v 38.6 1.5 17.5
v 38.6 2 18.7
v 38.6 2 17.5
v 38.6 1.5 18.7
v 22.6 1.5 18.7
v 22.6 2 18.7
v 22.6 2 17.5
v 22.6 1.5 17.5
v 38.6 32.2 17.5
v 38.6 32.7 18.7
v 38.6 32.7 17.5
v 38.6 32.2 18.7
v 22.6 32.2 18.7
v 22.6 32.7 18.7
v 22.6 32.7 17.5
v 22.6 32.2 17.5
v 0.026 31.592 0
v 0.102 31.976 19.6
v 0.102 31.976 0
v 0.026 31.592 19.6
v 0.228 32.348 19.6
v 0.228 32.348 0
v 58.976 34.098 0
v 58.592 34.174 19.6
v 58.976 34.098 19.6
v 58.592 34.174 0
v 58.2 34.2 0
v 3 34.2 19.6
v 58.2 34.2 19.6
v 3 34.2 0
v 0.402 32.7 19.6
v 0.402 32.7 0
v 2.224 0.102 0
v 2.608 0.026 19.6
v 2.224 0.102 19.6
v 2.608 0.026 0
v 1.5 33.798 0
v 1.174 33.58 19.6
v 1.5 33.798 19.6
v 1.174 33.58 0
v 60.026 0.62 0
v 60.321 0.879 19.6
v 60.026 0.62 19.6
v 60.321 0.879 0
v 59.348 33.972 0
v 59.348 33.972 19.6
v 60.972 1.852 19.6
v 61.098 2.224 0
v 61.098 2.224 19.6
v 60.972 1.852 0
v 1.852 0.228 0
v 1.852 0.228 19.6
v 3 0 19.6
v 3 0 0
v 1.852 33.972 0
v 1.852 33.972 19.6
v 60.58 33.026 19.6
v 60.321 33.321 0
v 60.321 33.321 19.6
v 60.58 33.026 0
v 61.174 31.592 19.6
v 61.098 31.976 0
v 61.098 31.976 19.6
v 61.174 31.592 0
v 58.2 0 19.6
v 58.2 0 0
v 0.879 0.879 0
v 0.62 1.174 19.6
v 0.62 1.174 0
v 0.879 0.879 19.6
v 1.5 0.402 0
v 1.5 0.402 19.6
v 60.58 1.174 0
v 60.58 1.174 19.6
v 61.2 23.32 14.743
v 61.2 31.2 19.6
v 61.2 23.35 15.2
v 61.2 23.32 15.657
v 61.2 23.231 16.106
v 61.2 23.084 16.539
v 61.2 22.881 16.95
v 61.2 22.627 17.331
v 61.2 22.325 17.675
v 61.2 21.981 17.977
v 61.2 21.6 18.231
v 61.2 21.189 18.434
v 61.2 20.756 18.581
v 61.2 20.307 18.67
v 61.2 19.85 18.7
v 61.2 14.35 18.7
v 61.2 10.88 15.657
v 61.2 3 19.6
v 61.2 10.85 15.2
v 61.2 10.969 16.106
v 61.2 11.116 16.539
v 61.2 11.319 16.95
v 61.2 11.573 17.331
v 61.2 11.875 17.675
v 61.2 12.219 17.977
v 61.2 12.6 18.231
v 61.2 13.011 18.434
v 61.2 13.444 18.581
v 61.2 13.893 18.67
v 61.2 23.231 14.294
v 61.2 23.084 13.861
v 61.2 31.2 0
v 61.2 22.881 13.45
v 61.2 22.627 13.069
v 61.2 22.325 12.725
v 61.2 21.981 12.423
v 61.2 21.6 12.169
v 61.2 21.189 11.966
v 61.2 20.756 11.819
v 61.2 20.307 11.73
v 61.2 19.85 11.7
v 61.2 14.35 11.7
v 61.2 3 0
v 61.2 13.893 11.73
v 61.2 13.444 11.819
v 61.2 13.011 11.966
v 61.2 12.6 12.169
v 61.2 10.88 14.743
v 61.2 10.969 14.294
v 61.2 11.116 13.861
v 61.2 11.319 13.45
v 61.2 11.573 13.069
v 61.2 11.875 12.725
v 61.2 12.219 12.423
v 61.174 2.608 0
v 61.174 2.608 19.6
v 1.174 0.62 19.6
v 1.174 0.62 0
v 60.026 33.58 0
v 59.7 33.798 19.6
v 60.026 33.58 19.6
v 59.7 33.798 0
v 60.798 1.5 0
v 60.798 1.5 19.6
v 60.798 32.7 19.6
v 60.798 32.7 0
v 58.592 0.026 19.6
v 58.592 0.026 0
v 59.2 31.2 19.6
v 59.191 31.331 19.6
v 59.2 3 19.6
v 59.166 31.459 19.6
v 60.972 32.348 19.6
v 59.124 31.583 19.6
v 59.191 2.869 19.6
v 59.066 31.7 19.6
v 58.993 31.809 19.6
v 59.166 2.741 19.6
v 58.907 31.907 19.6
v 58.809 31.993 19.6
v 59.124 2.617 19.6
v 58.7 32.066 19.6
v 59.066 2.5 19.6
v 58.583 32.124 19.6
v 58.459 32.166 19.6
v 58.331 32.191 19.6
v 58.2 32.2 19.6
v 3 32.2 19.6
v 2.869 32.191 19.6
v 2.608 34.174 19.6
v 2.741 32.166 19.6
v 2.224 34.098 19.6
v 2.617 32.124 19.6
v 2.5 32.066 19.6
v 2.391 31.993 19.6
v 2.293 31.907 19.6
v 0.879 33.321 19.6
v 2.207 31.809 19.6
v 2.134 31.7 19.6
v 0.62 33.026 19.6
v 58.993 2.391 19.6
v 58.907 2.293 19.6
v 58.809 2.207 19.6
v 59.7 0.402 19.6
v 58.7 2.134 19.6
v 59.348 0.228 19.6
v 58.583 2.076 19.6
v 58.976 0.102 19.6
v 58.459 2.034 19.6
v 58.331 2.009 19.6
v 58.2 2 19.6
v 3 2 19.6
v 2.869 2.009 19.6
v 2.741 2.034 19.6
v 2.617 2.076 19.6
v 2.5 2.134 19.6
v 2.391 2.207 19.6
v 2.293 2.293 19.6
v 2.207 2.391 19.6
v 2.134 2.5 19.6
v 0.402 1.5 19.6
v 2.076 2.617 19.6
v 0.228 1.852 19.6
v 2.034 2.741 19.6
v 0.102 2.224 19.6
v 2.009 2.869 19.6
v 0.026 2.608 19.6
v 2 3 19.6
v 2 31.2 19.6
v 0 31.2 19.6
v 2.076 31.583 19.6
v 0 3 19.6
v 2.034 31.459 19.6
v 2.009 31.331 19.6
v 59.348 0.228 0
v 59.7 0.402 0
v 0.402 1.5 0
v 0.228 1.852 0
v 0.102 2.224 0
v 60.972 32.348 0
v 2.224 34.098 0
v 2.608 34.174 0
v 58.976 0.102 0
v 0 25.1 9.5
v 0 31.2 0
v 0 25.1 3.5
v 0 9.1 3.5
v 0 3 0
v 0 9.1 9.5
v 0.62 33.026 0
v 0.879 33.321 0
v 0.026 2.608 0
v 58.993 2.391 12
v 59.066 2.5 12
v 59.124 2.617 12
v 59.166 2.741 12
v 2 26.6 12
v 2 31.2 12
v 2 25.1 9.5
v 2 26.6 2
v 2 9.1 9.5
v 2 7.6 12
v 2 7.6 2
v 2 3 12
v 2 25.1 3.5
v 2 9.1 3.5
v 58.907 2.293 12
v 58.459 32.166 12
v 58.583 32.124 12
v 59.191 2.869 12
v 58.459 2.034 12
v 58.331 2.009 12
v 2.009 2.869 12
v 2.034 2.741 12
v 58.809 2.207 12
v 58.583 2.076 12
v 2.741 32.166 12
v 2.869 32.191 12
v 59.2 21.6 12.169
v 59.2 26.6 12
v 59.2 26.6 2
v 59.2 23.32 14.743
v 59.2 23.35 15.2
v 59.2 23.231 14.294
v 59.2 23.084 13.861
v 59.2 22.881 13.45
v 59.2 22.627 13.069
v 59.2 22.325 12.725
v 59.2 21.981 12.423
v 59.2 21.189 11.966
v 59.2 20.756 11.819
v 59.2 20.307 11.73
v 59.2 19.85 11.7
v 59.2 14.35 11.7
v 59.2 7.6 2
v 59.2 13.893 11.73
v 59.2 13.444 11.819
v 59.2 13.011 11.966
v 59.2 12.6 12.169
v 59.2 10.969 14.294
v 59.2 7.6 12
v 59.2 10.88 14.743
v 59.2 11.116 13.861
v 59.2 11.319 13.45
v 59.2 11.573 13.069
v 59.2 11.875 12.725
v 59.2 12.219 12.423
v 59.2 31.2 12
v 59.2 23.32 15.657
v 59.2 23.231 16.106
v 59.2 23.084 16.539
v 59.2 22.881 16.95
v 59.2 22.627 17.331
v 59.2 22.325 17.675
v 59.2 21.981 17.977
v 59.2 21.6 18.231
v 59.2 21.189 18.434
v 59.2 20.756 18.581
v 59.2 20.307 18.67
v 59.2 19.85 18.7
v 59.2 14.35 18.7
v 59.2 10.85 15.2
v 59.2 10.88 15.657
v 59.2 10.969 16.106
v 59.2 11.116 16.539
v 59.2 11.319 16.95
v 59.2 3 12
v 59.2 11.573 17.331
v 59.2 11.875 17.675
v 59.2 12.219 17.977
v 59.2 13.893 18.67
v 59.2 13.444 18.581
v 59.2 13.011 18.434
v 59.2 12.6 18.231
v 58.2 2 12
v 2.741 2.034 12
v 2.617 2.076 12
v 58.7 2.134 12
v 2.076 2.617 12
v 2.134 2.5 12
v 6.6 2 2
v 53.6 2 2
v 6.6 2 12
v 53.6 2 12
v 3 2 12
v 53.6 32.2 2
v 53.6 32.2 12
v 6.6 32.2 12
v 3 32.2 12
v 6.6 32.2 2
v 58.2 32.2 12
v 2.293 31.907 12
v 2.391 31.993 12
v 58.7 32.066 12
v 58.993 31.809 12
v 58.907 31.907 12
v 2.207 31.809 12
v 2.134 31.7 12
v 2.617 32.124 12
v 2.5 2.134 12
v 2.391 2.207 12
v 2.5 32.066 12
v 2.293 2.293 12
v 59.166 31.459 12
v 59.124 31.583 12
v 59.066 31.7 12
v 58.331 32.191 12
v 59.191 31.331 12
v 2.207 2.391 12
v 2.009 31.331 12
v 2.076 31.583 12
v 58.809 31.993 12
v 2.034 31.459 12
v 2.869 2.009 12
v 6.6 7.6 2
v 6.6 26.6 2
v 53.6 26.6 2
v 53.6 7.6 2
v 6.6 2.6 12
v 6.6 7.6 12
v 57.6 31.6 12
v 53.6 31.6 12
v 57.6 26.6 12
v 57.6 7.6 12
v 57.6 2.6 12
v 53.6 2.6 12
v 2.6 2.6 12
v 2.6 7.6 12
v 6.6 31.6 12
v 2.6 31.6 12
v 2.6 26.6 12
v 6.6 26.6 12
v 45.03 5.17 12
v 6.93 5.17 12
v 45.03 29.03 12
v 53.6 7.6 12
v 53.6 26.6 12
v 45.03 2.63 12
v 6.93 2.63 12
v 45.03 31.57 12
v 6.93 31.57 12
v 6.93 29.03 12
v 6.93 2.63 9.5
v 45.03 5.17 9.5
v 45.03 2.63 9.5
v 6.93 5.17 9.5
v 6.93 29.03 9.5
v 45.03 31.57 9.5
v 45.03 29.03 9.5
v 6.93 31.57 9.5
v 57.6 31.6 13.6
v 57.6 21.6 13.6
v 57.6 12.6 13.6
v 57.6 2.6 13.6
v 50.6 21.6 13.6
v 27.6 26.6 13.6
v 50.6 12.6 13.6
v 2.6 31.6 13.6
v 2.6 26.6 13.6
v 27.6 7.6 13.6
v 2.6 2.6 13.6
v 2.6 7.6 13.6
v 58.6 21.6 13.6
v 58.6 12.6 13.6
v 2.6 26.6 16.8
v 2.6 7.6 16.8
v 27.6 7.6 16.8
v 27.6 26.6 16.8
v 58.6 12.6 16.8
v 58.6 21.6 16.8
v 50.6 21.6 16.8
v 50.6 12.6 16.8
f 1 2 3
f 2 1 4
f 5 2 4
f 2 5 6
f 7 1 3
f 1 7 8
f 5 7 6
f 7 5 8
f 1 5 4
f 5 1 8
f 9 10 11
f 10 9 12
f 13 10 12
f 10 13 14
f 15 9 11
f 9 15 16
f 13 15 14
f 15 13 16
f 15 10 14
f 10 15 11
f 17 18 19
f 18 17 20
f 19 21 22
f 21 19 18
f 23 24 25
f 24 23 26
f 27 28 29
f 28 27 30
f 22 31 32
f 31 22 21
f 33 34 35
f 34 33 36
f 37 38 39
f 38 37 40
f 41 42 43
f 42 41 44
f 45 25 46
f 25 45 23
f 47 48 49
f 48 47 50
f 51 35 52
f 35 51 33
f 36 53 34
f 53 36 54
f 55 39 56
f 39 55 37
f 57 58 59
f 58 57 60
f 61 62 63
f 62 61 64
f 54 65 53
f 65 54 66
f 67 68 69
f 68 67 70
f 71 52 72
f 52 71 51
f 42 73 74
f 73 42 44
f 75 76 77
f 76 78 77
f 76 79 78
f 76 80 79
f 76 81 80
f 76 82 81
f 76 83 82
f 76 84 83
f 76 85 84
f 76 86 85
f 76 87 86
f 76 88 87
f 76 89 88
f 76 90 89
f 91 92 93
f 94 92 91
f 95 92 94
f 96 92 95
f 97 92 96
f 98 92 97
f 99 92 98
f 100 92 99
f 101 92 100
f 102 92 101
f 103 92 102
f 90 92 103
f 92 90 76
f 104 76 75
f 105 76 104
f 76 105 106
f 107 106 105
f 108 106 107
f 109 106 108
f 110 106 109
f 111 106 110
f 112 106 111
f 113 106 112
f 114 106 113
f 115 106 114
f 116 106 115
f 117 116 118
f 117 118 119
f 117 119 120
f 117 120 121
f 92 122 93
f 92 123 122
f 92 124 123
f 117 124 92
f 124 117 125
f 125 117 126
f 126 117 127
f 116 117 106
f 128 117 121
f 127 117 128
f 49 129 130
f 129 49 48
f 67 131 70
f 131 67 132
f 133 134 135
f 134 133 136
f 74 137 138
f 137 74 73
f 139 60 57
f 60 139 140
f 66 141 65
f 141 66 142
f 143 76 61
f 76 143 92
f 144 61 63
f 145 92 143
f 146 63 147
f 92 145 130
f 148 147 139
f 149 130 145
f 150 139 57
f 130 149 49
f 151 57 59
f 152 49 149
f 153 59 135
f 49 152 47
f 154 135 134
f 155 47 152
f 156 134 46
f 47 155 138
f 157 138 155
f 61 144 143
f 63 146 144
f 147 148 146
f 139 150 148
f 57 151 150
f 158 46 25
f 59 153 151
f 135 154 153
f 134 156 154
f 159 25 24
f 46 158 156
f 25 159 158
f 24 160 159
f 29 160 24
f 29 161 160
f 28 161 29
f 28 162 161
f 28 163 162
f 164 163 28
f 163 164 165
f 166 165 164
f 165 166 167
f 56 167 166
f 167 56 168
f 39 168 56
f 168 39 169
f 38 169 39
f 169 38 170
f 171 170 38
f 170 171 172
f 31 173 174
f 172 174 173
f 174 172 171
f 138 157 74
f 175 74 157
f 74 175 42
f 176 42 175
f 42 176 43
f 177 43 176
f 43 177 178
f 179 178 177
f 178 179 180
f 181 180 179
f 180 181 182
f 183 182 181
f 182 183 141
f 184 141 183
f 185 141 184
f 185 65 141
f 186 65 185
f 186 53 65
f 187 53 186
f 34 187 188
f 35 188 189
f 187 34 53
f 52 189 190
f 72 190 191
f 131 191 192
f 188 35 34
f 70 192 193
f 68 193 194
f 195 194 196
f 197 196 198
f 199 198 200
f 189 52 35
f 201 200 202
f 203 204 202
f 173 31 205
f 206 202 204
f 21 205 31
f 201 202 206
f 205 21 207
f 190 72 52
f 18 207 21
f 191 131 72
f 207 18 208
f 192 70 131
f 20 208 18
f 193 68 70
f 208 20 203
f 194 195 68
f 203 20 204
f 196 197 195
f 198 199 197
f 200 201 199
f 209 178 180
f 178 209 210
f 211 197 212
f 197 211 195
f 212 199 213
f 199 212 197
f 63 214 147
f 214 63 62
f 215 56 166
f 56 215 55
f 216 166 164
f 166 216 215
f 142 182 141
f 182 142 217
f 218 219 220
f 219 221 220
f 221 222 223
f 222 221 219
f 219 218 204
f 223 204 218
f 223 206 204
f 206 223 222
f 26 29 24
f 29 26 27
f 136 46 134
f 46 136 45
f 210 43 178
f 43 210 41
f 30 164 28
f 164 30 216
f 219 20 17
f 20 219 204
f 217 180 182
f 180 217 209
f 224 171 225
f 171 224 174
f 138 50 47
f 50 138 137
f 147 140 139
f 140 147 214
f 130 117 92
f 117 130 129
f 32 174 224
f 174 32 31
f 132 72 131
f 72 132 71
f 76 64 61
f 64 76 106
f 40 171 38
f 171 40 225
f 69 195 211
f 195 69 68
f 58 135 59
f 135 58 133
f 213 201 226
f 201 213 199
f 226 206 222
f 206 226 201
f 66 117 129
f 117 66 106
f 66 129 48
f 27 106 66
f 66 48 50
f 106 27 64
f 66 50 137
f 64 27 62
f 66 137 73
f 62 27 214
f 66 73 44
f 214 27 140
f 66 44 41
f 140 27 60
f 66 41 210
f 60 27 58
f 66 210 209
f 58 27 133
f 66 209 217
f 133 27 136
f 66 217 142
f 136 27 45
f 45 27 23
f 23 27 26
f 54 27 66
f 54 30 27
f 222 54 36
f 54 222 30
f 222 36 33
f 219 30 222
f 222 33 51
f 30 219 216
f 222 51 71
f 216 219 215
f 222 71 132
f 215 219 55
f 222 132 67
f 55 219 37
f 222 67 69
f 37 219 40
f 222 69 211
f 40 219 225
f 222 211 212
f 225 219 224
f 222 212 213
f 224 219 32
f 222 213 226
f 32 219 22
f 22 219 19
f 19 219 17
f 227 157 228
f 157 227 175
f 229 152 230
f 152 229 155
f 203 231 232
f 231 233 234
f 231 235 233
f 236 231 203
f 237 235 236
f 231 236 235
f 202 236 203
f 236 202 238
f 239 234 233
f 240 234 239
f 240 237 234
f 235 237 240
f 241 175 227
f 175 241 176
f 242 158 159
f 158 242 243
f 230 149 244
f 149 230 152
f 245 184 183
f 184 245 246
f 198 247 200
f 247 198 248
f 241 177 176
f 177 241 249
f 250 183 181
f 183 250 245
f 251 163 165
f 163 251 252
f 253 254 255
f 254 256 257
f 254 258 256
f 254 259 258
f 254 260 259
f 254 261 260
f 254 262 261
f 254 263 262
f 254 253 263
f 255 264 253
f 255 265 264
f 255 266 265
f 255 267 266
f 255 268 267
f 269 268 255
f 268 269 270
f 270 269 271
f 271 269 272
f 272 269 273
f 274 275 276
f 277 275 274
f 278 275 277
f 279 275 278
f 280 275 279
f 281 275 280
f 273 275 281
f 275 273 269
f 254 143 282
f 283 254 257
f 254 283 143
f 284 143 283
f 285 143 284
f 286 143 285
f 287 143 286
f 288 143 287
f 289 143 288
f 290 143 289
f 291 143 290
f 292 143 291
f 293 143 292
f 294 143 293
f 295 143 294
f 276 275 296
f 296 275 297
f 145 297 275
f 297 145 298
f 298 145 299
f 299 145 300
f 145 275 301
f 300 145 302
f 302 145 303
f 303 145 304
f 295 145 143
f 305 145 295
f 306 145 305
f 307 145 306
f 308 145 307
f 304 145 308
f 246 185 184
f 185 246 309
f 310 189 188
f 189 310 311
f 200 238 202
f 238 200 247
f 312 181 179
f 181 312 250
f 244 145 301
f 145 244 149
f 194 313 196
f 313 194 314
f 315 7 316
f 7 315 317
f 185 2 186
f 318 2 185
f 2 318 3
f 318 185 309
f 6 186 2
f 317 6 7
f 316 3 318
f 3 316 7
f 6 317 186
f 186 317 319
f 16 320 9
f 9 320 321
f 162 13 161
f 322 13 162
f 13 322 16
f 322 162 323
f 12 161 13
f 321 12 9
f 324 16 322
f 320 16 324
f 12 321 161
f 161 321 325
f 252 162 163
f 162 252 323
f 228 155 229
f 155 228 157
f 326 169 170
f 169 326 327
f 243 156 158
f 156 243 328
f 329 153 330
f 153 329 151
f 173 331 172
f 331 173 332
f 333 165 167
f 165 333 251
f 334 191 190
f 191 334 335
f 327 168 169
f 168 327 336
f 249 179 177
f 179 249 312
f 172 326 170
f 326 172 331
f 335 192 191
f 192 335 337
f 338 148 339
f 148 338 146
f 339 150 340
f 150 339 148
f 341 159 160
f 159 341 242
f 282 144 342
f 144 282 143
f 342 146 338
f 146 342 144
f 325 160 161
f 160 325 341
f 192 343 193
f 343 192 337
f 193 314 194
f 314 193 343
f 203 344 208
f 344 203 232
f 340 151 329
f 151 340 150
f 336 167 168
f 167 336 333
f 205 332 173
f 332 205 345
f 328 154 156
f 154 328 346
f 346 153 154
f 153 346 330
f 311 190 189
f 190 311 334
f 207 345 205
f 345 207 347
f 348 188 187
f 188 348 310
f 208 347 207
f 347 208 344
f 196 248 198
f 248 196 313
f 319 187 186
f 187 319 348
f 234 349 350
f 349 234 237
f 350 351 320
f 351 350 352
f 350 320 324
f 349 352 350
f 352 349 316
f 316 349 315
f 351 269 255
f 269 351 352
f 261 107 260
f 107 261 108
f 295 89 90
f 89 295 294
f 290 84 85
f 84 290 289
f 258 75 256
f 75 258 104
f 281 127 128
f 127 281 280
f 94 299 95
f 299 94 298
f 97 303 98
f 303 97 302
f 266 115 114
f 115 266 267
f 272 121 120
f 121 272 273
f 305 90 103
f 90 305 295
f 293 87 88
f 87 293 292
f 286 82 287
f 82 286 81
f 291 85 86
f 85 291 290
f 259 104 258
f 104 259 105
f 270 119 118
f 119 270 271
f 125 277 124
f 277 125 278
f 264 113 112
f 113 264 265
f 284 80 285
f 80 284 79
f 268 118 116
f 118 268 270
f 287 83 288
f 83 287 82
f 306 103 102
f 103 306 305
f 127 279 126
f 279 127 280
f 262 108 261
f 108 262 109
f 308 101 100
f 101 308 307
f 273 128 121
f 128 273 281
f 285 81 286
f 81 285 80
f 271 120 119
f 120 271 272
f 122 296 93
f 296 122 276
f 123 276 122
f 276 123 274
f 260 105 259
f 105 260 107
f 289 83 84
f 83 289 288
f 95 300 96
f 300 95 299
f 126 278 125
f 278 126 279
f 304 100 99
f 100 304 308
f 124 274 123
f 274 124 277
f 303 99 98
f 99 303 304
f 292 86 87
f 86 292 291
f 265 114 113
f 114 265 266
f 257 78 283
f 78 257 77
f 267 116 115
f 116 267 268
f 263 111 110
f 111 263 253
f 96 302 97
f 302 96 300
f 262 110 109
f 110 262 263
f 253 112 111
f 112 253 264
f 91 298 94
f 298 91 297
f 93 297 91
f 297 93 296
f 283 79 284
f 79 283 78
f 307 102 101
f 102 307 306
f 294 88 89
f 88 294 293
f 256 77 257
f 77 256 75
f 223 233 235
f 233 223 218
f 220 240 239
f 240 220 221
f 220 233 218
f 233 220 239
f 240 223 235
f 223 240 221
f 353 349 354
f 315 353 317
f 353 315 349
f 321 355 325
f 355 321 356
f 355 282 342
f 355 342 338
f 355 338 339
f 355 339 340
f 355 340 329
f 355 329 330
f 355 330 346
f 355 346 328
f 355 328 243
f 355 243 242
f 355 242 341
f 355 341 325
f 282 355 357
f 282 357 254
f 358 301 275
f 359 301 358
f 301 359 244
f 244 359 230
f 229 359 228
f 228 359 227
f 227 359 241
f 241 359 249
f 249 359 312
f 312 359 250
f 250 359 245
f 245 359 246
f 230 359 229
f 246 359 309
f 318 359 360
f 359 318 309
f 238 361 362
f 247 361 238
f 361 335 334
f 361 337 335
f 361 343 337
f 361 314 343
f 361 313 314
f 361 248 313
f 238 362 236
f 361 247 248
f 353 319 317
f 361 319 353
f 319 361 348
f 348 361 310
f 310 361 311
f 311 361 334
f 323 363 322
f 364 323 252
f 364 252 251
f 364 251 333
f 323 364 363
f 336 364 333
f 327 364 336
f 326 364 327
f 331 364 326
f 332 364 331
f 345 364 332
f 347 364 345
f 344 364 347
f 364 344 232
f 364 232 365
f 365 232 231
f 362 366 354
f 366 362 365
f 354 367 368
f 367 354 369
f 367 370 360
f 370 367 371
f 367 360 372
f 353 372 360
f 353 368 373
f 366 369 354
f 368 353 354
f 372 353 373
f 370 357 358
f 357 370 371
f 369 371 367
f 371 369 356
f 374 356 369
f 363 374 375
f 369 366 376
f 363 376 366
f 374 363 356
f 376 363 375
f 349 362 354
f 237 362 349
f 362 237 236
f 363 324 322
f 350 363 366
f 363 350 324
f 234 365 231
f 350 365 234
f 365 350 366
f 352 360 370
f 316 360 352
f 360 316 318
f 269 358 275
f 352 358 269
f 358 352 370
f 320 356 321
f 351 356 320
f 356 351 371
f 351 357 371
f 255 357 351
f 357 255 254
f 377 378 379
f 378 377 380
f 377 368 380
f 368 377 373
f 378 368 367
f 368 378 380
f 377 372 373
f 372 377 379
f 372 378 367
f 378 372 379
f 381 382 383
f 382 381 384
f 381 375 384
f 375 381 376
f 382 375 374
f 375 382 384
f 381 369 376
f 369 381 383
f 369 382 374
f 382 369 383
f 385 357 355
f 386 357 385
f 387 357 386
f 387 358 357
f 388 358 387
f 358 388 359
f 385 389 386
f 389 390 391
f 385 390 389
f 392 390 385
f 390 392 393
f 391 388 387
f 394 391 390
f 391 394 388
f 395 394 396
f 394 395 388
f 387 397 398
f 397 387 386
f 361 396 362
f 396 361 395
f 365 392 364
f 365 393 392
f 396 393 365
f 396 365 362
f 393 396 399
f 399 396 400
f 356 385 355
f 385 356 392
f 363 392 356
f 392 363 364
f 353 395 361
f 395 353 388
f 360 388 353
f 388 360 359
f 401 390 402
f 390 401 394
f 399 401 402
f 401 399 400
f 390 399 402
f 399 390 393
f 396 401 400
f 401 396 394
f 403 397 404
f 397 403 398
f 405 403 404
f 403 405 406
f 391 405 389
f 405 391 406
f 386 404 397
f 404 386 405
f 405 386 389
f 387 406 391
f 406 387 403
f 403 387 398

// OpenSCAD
// ESP32 DevKit (30-pin, USB-C, ESP-WROOM-32) enclosure
// Base + snap-fit lid with flexible BOOT / EN buttons and LED window.
//
// Render one part at a time:  part = "base" | "lid" | "both" (preview)
// Board dimensions were estimated from photos: MEASURE YOUR BOARD WITH CALIPERS
// and adjust pcb_l / pcb_w / button positions before printing.

part = "both";

/* [Board] */
pcb_l   = 55.0;   // along USB axis (antenna end -> USB end)
pcb_w   = 29.0;   // across the two header rows
pcb_t   = 1.6;
under   = 10.0;   // free space below PCB for soldered header pins
over    = 6.0;    // free space above PCB top (module ~3.2, USB-C ~3.3)
fit     = 0.6;    // gap between PCB edge and inner wall
usb_overhang = 1.0; // how far the USB-C receptacle sticks out past the PCB edge

// Feature positions in PCB coordinates (origin = antenna-end corner on the EN side,
// x toward USB, y toward the 3V3/BOOT header row, board top side up).
boot_pos = [51.0, 23.0];
en_pos   = [51.0,  6.0];
led_pos  = [31.0,  9.5];
usb_z    = 1.6;          // USB-C centre height above PCB top
btn_h    = 2.0;          // tactile button top above PCB top

/* [Case] */
wall    = 2.0;
floor_t = 2.0;
lid_t   = 2.0;
r_out   = 3.0;
lip_h   = 3.0;
lip_t   = 1.2;
lip_gap = 0.2;

usb_cut   = [12.5, 7.0];  // cable overmould opening (w, h)
wire_slot = true;         // slot on antenna end, below the PCB, for jumper wires
slot_wh   = [16, 6];
vents     = true;

$fn = 48;

// ---------------------------------------------------------------- derived
in_l  = pcb_l + usb_overhang + 2*fit;
in_w  = pcb_w + 2*fit;
out_l = in_l + 2*wall;
out_w = in_w + 2*wall;
z_pcb = floor_t + under;          // PCB bottom
z_top = z_pcb + pcb_t;            // PCB top
z_rim = z_top + over;             // top of base walls = lid underside
eps   = 0.01;

// PCB coordinate -> case coordinate
function P(p) = [wall + fit + p[0], wall + fit + p[1]];

module rbox(l, w, h, r) {
    hull() for (x = [r, l - r], y = [r, w - r])
        translate([x, y, 0]) cylinder(r = r, h = h);
}

module usb_hole(extra = 0) {
    c = P([pcb_l, pcb_w/2]);
    translate([out_l - wall - 1, c[1], z_top + usb_z])
        rotate([0, 90, 0])
            hull() for (s = [-1, 1])
                translate([0, s*(usb_cut[0] - usb_cut[1])/2, 0])
                    cylinder(d = usb_cut[1] + extra, h = wall + 2 + extra);
}

// ---------------------------------------------------------------- base
module base() {
    difference() {
        rbox(out_l, out_w, z_rim, r_out);
        // cavity
        translate([wall, wall, floor_t]) rbox(in_l, in_w, z_rim, max(r_out - wall, 0.5));
        usb_hole();
        if (wire_slot)
            translate([-1, out_w/2 - slot_wh[0]/2, floor_t + 1.5])
                cube([wall + 2, slot_wh[0], slot_wh[1]]);
        // snap grooves on long walls
        for (y = [wall - 0.5, out_w - wall - eps])
            translate([out_l/2 - 8, y, z_rim - lip_h/2 - 0.6])
                cube([16, 0.5 + eps, 1.2]);
    }
    // corner support pads (avoid header pins, which start ~5.5 mm from each end)
    pad = [4.0, 5.0];
    for (x = [0, pcb_l - pad[0]], y = [0, pcb_w - pad[1]]) {
        p = P([x, y]);
        translate([p[0] - (x == 0 ? fit : 0), p[1] - (y == 0 ? fit : 0), floor_t - eps])
            cube([pad[0] + fit + (x == 0 ? 0 : usb_overhang), pad[1] + fit, under + eps]);
    }
}

// ---------------------------------------------------------------- lid
// Modelled in place (lid underside at z_rim). Printed flipped (see lid_print()).
tab_w = 4.0; tab_l = 10.0; tab_t = 1.0; slit = 0.8;

module flex_tab_cut(p) {
    c = P(p);
    // U-shaped slit, hinge toward the centre of the board (-x)
    translate([c[0] - tab_l + tab_w/2, c[1], z_rim - eps])
        difference() {
            translate([0, -tab_w/2 - slit, 0])
                cube([tab_l + slit, tab_w + 2*slit, lid_t + 2*eps]);
            translate([-eps, -tab_w/2, -eps])
                cube([tab_l, tab_w, lid_t + 4*eps]);
        }
    // thin the tab from below so it flexes
    translate([c[0] - tab_l + tab_w/2, c[1] - tab_w/2, z_rim - eps])
        cube([tab_l, tab_w, lid_t - tab_t + eps]);
}

module flex_tab_nub(p) {
    c = P(p);
    z0 = z_top + btn_h + 0.3;
    translate([c[0], c[1], z0]) cylinder(d = 3, h = z_rim + lid_t - tab_t - z0 + eps);
}

module lid() {
    difference() {
        union() {
            translate([0, 0, z_rim]) rbox(out_l, out_w, lid_t, r_out);
            // locating lip
            difference() {
                translate([wall + lip_gap, wall + lip_gap, z_rim - lip_h])
                    rbox(in_l - 2*lip_gap, in_w - 2*lip_gap, lip_h + eps, max(r_out - wall - lip_gap, 0.5));
                translate([wall + lip_gap + lip_t, wall + lip_gap + lip_t, z_rim - lip_h - 1])
                    cube([in_l - 2*(lip_gap + lip_t), in_w - 2*(lip_gap + lip_t), lip_h + 2]);
            }
            // snap bumps
            for (y = [wall + lip_gap, out_w - wall - lip_gap])
                translate([out_l/2 - 7, y, z_rim - lip_h/2 - 0.6 + 0.6])
                    rotate([0, 90, 0]) cylinder(r = 0.45, h = 14, $fn = 16);
            // hold-down blocks on the PCB corners (sized to bridge the mounting holes,
            // kept clear of the module, header pins, buttons and USB-C)
            for (b = [[0, 0, 2.0, 4.5], [0, pcb_w - 4.5, 2.0, 4.5],
                      [pcb_l - 1.5, 0.3, 1.5, 2.7], [pcb_l - 1.5, pcb_w - 3.0, 1.5, 2.7]]) {
                c = P([b[0], b[1]]);
                translate([c[0], c[1], z_top + 0.1]) cube([b[2], b[3], over]);
            }
        }
        // clear lip around the USB connector
        translate([out_l - wall - lip_t - 2, out_w/2 - usb_cut[0]/2 - 1, z_rim - lip_h - 1])
            cube([lip_t + 3, usb_cut[0] + 2, lip_h + 1]);
        flex_tab_cut(boot_pos);
        flex_tab_cut(en_pos);
        // LED window
        c = P(led_pos);
        translate([c[0], c[1], z_rim - 1]) cylinder(d = 4, h = lid_t + 2);
        // vents over the middle of the board
        if (vents)
            for (i = [0:4])
                translate([P([8 + i*3.2, 0])[0], P([0, 13])[1] - 5, z_rim - 1])
                    hull() {
                        cylinder(d = 1.6, h = lid_t + 2, $fn = 16);
                        translate([0, 10, 0]) cylinder(d = 1.6, h = lid_t + 2, $fn = 16);
                    }
    }
    flex_tab_nub(boot_pos);
    flex_tab_nub(en_pos);
}

module lid_print() {
    translate([0, out_w, z_rim + lid_t]) rotate([180, 0, 0]) lid();
}

// ---------------------------------------------------------------- dummy board (preview only)
module board() {
    color("darkgreen") translate([P([0, 0])[0], P([0, 0])[1], z_pcb]) cube([pcb_l, pcb_w, pcb_t]);
    color("silver") translate([P([0, 5])[0], P([0, 5])[1], z_top]) cube([25, 19, 3.2]);
    color("silver") translate([P([pcb_l - 7, pcb_w/2 - 4.5])[0], P([0, pcb_w/2 - 4.5])[1], z_top]) cube([8, 9, 3.2]);
    for (y = [1.3, pcb_w - 1.3], i = [0:14])
        color("black") translate([P([5.6 + i*2.54, y])[0] - 1.27, P([0, y])[1] - 1.27, z_pcb - 2.5]) cube([2.54, 2.54, 2.5]);
}

if (part == "base") base();
else if (part == "lid") lid_print();
else { base(); board(); translate([0, 0, 15]) %lid(); }
